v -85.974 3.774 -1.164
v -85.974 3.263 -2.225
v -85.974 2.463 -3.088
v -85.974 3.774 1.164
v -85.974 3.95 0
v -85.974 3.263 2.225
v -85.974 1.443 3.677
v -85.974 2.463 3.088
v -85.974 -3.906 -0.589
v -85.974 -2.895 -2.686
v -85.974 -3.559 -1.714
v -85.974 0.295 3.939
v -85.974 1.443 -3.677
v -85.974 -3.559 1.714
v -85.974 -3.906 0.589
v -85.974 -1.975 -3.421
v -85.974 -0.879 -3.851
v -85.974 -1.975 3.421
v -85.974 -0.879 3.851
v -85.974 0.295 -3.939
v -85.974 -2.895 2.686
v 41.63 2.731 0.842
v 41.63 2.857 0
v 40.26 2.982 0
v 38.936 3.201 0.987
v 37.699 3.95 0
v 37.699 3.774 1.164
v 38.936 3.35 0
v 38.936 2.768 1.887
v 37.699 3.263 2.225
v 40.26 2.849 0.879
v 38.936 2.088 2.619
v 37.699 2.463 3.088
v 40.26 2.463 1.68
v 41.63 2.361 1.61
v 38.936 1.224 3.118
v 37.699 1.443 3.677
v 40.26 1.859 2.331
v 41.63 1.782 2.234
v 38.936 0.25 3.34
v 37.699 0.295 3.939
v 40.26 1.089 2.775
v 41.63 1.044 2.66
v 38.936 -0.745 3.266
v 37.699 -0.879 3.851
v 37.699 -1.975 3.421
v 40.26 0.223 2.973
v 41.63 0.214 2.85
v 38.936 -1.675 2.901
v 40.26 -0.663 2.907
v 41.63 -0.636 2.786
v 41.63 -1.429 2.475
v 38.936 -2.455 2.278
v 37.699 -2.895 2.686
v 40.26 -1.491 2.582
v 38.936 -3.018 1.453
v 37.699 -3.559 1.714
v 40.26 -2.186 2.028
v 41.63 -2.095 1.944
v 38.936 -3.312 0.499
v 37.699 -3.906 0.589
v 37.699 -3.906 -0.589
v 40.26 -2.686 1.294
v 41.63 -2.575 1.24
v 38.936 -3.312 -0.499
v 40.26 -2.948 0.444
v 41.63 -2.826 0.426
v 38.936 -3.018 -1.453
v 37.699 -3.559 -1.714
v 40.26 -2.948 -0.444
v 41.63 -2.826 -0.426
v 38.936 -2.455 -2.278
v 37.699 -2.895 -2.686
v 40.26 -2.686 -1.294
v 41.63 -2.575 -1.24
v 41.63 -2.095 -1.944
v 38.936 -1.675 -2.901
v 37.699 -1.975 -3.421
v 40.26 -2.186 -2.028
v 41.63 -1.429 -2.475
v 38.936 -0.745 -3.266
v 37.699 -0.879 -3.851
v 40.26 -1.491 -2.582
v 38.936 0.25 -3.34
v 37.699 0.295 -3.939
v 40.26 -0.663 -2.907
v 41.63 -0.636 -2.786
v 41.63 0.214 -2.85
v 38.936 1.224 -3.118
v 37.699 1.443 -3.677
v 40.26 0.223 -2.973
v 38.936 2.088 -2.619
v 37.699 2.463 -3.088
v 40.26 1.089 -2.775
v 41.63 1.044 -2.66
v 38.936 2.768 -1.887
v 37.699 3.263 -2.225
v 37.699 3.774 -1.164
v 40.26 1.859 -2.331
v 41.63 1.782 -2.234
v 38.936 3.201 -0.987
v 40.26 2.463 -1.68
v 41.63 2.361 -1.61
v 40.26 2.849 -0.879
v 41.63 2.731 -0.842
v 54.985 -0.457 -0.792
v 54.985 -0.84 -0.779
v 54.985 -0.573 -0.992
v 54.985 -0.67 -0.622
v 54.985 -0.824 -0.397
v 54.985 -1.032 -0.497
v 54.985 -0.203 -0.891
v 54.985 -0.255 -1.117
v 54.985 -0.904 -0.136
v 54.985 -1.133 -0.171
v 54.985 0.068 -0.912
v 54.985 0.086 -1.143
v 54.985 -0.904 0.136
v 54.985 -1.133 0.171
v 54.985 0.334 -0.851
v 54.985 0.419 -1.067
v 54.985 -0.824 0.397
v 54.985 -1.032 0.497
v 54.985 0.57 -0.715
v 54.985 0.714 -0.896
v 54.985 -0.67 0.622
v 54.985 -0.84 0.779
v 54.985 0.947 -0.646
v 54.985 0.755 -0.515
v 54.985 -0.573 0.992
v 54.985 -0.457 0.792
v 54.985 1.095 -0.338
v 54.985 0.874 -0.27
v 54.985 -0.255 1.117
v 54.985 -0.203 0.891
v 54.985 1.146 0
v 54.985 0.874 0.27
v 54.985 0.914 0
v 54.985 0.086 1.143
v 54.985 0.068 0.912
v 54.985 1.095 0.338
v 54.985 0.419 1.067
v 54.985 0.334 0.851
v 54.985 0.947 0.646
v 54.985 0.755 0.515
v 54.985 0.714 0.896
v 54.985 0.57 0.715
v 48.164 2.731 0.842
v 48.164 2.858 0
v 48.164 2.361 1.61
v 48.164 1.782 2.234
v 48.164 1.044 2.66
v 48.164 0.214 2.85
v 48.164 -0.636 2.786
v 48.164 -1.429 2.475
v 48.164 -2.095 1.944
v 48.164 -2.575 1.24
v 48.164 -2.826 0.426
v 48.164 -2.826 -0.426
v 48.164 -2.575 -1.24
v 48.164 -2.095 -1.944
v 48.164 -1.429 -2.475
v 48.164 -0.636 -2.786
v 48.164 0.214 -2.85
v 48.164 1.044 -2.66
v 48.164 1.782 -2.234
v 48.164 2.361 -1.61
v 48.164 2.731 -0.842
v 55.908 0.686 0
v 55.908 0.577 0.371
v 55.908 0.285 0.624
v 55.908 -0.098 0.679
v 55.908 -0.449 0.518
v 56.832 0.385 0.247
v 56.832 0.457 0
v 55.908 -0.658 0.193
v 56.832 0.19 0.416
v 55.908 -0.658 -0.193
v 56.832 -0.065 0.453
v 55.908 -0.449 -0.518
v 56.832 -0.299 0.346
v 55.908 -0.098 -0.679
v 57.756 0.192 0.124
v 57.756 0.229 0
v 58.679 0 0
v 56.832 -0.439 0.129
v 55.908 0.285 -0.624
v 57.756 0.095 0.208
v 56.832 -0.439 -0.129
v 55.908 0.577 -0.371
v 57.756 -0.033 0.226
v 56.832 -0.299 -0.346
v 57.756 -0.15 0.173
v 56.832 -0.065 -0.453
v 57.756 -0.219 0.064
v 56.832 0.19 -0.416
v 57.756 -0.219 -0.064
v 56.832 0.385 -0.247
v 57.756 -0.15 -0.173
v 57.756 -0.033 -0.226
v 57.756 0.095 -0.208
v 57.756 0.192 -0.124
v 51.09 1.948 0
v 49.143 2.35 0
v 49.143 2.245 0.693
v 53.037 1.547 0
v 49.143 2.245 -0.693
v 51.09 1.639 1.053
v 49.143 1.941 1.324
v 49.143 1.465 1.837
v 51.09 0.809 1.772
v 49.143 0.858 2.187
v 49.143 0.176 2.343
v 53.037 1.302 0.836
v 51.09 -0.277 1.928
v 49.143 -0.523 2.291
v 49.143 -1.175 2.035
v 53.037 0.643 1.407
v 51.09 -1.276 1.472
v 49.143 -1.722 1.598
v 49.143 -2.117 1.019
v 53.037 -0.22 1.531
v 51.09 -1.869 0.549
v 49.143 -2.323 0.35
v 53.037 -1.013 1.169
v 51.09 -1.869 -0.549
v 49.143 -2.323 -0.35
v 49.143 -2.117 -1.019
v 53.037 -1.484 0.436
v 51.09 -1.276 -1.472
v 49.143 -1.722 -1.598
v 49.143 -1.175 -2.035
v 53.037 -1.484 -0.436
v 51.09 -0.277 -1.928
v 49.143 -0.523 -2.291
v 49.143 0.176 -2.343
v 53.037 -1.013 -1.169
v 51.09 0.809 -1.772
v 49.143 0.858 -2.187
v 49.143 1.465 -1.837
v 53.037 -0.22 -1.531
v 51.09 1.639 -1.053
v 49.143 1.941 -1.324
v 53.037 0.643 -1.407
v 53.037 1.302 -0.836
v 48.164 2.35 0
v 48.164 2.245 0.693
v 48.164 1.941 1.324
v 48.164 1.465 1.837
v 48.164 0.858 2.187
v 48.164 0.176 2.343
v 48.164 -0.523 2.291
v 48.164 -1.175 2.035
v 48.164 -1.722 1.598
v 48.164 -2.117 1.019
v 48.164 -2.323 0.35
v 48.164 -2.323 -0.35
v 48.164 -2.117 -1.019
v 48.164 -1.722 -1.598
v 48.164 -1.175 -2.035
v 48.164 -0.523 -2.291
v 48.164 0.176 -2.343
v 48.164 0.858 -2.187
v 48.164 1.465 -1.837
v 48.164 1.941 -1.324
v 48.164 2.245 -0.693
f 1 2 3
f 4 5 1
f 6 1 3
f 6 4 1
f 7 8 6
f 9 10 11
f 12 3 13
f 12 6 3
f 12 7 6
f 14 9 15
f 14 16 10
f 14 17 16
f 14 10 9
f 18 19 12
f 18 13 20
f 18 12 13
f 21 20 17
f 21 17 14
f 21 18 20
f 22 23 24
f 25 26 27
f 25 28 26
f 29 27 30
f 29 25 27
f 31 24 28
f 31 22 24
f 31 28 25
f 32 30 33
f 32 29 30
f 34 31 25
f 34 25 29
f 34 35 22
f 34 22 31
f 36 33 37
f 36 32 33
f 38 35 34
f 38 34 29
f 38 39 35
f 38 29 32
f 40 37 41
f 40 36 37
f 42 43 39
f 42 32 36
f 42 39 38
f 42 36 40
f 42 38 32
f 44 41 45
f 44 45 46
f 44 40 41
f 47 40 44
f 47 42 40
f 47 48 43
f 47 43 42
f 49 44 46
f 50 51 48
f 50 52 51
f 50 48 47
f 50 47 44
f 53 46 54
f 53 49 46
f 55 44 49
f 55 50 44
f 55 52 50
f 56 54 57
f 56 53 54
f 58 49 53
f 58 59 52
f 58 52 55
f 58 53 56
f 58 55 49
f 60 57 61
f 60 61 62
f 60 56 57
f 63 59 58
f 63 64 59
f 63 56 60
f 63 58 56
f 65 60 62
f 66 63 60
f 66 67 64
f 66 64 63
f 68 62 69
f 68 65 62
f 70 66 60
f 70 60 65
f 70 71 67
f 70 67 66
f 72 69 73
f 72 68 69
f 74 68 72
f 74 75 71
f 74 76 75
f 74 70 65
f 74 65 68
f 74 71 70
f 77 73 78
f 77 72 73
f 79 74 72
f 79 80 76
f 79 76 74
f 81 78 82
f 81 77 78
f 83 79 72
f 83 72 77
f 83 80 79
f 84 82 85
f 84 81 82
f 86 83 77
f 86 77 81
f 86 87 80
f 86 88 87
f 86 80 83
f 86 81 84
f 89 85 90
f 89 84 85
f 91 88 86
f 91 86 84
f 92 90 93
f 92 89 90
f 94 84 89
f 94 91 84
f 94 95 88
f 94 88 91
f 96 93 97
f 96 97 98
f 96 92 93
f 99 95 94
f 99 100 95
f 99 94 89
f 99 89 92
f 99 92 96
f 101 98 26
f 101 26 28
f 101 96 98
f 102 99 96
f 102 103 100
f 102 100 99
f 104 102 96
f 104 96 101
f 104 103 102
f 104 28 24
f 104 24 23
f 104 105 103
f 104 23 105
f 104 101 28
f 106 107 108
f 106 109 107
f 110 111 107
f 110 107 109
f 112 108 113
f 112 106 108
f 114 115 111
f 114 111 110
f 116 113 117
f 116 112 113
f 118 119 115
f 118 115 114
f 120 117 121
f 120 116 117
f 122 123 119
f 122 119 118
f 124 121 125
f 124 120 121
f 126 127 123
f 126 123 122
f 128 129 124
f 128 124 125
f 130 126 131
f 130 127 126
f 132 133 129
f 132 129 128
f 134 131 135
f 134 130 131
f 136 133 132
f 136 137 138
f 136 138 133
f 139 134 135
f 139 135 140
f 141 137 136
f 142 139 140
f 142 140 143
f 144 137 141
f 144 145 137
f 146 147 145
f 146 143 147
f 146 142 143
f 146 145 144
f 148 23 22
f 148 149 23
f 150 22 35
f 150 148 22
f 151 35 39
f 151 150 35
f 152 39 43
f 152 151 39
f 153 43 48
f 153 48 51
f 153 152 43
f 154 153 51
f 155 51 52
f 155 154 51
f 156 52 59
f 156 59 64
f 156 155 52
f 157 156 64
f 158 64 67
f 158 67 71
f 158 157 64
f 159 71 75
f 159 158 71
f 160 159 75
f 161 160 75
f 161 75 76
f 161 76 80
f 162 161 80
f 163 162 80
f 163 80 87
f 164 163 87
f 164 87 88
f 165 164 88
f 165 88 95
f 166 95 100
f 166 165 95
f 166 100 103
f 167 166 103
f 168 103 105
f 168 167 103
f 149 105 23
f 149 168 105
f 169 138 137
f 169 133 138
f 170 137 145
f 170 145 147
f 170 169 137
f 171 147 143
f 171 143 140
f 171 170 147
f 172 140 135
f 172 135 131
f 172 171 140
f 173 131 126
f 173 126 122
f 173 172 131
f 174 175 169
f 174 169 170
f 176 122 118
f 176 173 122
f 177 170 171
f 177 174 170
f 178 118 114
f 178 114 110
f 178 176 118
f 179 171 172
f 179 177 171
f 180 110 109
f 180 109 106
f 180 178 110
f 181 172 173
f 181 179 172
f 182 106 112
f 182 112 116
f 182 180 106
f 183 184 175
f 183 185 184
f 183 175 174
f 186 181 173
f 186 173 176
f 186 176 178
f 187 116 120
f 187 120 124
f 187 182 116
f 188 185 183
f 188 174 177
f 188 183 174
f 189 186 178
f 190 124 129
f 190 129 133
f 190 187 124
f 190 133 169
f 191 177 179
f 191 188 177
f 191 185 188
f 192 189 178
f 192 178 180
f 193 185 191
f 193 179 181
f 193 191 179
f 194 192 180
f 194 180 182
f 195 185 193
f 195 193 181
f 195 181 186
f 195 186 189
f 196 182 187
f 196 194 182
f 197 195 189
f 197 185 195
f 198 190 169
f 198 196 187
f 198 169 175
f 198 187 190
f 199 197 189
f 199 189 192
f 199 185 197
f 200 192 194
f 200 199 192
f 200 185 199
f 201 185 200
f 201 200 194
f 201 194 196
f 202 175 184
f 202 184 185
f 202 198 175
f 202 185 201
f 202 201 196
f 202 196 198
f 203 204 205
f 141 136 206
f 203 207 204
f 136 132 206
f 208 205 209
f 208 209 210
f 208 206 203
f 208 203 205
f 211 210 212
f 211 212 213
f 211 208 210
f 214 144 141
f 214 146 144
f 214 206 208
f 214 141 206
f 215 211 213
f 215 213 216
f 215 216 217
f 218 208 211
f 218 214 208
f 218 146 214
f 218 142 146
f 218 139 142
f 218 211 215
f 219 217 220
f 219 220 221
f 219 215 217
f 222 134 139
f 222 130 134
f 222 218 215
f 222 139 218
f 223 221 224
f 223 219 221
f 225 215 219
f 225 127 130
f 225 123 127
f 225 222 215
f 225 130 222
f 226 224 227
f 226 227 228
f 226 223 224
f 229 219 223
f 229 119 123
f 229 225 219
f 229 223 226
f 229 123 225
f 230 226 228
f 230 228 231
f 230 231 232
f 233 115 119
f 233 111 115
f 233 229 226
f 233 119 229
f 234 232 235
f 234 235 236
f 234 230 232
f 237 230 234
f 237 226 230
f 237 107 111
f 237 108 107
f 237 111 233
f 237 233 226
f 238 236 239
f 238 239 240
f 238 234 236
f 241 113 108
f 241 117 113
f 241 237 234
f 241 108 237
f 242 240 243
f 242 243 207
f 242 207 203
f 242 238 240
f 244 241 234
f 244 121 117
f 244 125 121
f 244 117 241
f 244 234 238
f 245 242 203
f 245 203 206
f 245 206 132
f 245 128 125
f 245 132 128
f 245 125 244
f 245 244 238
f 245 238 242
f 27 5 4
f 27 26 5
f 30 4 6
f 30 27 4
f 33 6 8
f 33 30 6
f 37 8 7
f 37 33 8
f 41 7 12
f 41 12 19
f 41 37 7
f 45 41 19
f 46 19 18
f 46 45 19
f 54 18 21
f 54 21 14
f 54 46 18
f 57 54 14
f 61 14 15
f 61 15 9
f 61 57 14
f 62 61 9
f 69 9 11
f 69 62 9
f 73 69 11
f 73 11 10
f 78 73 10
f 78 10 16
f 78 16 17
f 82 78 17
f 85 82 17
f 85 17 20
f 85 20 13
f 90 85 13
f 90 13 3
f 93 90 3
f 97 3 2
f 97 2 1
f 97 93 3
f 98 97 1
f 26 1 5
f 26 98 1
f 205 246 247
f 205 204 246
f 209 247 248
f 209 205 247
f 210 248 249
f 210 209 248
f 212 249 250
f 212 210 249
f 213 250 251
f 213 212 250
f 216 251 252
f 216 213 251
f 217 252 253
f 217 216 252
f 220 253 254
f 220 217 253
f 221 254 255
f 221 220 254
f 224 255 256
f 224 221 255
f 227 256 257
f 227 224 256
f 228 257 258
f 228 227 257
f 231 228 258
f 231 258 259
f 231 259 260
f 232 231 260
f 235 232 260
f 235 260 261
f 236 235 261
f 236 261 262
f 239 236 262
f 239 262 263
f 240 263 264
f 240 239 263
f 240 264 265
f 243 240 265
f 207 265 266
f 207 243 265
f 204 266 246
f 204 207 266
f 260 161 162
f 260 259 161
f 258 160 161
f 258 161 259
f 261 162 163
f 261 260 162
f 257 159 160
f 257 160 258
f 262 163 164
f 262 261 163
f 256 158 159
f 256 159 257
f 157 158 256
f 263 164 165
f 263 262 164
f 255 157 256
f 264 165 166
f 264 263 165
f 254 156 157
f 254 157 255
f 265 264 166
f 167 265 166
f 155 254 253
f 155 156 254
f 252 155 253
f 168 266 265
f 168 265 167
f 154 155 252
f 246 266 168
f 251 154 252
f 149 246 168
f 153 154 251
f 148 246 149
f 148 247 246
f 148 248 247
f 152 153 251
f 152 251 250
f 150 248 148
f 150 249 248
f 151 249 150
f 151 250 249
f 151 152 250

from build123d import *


with BuildPart() as part:
    # Sketch1 → Revolve1 (revolve)
    with BuildSketch(Plane.XY):
        with BuildLine():
            Line((-85.973820479, 0), (-85.973820479, 3.9497))
            Line((-85.973820479, 3.9497), (37.698779521, 3.9497))
            ThreePointArc((37.698779521, 3.9497), (39.589789562, 3.135625716), (41.629711619, 2.8575))
            Line((41.629711619, 2.8575), (48.163579521, 2.8575))
            Line((48.163579521, 2.8575), (48.163579521, 2.3495))
            Line((48.163579521, 2.3495), (49.142936851, 2.3495))
            Line((49.142936851, 2.3495), (54.984769387, 1.145946184))
            Line((54.984769387, 1.145946184), (54.984769387, 0.914360397))
            Line((54.984769387, 0.914360397), (58.679179521, 0))
            Line((58.679179521, 0), (-85.973820479, 0))
        make_face()
    revolve(axis=Axis((-85.973820479, 0, 0), (1, 0, 0)))


solid = part.part
